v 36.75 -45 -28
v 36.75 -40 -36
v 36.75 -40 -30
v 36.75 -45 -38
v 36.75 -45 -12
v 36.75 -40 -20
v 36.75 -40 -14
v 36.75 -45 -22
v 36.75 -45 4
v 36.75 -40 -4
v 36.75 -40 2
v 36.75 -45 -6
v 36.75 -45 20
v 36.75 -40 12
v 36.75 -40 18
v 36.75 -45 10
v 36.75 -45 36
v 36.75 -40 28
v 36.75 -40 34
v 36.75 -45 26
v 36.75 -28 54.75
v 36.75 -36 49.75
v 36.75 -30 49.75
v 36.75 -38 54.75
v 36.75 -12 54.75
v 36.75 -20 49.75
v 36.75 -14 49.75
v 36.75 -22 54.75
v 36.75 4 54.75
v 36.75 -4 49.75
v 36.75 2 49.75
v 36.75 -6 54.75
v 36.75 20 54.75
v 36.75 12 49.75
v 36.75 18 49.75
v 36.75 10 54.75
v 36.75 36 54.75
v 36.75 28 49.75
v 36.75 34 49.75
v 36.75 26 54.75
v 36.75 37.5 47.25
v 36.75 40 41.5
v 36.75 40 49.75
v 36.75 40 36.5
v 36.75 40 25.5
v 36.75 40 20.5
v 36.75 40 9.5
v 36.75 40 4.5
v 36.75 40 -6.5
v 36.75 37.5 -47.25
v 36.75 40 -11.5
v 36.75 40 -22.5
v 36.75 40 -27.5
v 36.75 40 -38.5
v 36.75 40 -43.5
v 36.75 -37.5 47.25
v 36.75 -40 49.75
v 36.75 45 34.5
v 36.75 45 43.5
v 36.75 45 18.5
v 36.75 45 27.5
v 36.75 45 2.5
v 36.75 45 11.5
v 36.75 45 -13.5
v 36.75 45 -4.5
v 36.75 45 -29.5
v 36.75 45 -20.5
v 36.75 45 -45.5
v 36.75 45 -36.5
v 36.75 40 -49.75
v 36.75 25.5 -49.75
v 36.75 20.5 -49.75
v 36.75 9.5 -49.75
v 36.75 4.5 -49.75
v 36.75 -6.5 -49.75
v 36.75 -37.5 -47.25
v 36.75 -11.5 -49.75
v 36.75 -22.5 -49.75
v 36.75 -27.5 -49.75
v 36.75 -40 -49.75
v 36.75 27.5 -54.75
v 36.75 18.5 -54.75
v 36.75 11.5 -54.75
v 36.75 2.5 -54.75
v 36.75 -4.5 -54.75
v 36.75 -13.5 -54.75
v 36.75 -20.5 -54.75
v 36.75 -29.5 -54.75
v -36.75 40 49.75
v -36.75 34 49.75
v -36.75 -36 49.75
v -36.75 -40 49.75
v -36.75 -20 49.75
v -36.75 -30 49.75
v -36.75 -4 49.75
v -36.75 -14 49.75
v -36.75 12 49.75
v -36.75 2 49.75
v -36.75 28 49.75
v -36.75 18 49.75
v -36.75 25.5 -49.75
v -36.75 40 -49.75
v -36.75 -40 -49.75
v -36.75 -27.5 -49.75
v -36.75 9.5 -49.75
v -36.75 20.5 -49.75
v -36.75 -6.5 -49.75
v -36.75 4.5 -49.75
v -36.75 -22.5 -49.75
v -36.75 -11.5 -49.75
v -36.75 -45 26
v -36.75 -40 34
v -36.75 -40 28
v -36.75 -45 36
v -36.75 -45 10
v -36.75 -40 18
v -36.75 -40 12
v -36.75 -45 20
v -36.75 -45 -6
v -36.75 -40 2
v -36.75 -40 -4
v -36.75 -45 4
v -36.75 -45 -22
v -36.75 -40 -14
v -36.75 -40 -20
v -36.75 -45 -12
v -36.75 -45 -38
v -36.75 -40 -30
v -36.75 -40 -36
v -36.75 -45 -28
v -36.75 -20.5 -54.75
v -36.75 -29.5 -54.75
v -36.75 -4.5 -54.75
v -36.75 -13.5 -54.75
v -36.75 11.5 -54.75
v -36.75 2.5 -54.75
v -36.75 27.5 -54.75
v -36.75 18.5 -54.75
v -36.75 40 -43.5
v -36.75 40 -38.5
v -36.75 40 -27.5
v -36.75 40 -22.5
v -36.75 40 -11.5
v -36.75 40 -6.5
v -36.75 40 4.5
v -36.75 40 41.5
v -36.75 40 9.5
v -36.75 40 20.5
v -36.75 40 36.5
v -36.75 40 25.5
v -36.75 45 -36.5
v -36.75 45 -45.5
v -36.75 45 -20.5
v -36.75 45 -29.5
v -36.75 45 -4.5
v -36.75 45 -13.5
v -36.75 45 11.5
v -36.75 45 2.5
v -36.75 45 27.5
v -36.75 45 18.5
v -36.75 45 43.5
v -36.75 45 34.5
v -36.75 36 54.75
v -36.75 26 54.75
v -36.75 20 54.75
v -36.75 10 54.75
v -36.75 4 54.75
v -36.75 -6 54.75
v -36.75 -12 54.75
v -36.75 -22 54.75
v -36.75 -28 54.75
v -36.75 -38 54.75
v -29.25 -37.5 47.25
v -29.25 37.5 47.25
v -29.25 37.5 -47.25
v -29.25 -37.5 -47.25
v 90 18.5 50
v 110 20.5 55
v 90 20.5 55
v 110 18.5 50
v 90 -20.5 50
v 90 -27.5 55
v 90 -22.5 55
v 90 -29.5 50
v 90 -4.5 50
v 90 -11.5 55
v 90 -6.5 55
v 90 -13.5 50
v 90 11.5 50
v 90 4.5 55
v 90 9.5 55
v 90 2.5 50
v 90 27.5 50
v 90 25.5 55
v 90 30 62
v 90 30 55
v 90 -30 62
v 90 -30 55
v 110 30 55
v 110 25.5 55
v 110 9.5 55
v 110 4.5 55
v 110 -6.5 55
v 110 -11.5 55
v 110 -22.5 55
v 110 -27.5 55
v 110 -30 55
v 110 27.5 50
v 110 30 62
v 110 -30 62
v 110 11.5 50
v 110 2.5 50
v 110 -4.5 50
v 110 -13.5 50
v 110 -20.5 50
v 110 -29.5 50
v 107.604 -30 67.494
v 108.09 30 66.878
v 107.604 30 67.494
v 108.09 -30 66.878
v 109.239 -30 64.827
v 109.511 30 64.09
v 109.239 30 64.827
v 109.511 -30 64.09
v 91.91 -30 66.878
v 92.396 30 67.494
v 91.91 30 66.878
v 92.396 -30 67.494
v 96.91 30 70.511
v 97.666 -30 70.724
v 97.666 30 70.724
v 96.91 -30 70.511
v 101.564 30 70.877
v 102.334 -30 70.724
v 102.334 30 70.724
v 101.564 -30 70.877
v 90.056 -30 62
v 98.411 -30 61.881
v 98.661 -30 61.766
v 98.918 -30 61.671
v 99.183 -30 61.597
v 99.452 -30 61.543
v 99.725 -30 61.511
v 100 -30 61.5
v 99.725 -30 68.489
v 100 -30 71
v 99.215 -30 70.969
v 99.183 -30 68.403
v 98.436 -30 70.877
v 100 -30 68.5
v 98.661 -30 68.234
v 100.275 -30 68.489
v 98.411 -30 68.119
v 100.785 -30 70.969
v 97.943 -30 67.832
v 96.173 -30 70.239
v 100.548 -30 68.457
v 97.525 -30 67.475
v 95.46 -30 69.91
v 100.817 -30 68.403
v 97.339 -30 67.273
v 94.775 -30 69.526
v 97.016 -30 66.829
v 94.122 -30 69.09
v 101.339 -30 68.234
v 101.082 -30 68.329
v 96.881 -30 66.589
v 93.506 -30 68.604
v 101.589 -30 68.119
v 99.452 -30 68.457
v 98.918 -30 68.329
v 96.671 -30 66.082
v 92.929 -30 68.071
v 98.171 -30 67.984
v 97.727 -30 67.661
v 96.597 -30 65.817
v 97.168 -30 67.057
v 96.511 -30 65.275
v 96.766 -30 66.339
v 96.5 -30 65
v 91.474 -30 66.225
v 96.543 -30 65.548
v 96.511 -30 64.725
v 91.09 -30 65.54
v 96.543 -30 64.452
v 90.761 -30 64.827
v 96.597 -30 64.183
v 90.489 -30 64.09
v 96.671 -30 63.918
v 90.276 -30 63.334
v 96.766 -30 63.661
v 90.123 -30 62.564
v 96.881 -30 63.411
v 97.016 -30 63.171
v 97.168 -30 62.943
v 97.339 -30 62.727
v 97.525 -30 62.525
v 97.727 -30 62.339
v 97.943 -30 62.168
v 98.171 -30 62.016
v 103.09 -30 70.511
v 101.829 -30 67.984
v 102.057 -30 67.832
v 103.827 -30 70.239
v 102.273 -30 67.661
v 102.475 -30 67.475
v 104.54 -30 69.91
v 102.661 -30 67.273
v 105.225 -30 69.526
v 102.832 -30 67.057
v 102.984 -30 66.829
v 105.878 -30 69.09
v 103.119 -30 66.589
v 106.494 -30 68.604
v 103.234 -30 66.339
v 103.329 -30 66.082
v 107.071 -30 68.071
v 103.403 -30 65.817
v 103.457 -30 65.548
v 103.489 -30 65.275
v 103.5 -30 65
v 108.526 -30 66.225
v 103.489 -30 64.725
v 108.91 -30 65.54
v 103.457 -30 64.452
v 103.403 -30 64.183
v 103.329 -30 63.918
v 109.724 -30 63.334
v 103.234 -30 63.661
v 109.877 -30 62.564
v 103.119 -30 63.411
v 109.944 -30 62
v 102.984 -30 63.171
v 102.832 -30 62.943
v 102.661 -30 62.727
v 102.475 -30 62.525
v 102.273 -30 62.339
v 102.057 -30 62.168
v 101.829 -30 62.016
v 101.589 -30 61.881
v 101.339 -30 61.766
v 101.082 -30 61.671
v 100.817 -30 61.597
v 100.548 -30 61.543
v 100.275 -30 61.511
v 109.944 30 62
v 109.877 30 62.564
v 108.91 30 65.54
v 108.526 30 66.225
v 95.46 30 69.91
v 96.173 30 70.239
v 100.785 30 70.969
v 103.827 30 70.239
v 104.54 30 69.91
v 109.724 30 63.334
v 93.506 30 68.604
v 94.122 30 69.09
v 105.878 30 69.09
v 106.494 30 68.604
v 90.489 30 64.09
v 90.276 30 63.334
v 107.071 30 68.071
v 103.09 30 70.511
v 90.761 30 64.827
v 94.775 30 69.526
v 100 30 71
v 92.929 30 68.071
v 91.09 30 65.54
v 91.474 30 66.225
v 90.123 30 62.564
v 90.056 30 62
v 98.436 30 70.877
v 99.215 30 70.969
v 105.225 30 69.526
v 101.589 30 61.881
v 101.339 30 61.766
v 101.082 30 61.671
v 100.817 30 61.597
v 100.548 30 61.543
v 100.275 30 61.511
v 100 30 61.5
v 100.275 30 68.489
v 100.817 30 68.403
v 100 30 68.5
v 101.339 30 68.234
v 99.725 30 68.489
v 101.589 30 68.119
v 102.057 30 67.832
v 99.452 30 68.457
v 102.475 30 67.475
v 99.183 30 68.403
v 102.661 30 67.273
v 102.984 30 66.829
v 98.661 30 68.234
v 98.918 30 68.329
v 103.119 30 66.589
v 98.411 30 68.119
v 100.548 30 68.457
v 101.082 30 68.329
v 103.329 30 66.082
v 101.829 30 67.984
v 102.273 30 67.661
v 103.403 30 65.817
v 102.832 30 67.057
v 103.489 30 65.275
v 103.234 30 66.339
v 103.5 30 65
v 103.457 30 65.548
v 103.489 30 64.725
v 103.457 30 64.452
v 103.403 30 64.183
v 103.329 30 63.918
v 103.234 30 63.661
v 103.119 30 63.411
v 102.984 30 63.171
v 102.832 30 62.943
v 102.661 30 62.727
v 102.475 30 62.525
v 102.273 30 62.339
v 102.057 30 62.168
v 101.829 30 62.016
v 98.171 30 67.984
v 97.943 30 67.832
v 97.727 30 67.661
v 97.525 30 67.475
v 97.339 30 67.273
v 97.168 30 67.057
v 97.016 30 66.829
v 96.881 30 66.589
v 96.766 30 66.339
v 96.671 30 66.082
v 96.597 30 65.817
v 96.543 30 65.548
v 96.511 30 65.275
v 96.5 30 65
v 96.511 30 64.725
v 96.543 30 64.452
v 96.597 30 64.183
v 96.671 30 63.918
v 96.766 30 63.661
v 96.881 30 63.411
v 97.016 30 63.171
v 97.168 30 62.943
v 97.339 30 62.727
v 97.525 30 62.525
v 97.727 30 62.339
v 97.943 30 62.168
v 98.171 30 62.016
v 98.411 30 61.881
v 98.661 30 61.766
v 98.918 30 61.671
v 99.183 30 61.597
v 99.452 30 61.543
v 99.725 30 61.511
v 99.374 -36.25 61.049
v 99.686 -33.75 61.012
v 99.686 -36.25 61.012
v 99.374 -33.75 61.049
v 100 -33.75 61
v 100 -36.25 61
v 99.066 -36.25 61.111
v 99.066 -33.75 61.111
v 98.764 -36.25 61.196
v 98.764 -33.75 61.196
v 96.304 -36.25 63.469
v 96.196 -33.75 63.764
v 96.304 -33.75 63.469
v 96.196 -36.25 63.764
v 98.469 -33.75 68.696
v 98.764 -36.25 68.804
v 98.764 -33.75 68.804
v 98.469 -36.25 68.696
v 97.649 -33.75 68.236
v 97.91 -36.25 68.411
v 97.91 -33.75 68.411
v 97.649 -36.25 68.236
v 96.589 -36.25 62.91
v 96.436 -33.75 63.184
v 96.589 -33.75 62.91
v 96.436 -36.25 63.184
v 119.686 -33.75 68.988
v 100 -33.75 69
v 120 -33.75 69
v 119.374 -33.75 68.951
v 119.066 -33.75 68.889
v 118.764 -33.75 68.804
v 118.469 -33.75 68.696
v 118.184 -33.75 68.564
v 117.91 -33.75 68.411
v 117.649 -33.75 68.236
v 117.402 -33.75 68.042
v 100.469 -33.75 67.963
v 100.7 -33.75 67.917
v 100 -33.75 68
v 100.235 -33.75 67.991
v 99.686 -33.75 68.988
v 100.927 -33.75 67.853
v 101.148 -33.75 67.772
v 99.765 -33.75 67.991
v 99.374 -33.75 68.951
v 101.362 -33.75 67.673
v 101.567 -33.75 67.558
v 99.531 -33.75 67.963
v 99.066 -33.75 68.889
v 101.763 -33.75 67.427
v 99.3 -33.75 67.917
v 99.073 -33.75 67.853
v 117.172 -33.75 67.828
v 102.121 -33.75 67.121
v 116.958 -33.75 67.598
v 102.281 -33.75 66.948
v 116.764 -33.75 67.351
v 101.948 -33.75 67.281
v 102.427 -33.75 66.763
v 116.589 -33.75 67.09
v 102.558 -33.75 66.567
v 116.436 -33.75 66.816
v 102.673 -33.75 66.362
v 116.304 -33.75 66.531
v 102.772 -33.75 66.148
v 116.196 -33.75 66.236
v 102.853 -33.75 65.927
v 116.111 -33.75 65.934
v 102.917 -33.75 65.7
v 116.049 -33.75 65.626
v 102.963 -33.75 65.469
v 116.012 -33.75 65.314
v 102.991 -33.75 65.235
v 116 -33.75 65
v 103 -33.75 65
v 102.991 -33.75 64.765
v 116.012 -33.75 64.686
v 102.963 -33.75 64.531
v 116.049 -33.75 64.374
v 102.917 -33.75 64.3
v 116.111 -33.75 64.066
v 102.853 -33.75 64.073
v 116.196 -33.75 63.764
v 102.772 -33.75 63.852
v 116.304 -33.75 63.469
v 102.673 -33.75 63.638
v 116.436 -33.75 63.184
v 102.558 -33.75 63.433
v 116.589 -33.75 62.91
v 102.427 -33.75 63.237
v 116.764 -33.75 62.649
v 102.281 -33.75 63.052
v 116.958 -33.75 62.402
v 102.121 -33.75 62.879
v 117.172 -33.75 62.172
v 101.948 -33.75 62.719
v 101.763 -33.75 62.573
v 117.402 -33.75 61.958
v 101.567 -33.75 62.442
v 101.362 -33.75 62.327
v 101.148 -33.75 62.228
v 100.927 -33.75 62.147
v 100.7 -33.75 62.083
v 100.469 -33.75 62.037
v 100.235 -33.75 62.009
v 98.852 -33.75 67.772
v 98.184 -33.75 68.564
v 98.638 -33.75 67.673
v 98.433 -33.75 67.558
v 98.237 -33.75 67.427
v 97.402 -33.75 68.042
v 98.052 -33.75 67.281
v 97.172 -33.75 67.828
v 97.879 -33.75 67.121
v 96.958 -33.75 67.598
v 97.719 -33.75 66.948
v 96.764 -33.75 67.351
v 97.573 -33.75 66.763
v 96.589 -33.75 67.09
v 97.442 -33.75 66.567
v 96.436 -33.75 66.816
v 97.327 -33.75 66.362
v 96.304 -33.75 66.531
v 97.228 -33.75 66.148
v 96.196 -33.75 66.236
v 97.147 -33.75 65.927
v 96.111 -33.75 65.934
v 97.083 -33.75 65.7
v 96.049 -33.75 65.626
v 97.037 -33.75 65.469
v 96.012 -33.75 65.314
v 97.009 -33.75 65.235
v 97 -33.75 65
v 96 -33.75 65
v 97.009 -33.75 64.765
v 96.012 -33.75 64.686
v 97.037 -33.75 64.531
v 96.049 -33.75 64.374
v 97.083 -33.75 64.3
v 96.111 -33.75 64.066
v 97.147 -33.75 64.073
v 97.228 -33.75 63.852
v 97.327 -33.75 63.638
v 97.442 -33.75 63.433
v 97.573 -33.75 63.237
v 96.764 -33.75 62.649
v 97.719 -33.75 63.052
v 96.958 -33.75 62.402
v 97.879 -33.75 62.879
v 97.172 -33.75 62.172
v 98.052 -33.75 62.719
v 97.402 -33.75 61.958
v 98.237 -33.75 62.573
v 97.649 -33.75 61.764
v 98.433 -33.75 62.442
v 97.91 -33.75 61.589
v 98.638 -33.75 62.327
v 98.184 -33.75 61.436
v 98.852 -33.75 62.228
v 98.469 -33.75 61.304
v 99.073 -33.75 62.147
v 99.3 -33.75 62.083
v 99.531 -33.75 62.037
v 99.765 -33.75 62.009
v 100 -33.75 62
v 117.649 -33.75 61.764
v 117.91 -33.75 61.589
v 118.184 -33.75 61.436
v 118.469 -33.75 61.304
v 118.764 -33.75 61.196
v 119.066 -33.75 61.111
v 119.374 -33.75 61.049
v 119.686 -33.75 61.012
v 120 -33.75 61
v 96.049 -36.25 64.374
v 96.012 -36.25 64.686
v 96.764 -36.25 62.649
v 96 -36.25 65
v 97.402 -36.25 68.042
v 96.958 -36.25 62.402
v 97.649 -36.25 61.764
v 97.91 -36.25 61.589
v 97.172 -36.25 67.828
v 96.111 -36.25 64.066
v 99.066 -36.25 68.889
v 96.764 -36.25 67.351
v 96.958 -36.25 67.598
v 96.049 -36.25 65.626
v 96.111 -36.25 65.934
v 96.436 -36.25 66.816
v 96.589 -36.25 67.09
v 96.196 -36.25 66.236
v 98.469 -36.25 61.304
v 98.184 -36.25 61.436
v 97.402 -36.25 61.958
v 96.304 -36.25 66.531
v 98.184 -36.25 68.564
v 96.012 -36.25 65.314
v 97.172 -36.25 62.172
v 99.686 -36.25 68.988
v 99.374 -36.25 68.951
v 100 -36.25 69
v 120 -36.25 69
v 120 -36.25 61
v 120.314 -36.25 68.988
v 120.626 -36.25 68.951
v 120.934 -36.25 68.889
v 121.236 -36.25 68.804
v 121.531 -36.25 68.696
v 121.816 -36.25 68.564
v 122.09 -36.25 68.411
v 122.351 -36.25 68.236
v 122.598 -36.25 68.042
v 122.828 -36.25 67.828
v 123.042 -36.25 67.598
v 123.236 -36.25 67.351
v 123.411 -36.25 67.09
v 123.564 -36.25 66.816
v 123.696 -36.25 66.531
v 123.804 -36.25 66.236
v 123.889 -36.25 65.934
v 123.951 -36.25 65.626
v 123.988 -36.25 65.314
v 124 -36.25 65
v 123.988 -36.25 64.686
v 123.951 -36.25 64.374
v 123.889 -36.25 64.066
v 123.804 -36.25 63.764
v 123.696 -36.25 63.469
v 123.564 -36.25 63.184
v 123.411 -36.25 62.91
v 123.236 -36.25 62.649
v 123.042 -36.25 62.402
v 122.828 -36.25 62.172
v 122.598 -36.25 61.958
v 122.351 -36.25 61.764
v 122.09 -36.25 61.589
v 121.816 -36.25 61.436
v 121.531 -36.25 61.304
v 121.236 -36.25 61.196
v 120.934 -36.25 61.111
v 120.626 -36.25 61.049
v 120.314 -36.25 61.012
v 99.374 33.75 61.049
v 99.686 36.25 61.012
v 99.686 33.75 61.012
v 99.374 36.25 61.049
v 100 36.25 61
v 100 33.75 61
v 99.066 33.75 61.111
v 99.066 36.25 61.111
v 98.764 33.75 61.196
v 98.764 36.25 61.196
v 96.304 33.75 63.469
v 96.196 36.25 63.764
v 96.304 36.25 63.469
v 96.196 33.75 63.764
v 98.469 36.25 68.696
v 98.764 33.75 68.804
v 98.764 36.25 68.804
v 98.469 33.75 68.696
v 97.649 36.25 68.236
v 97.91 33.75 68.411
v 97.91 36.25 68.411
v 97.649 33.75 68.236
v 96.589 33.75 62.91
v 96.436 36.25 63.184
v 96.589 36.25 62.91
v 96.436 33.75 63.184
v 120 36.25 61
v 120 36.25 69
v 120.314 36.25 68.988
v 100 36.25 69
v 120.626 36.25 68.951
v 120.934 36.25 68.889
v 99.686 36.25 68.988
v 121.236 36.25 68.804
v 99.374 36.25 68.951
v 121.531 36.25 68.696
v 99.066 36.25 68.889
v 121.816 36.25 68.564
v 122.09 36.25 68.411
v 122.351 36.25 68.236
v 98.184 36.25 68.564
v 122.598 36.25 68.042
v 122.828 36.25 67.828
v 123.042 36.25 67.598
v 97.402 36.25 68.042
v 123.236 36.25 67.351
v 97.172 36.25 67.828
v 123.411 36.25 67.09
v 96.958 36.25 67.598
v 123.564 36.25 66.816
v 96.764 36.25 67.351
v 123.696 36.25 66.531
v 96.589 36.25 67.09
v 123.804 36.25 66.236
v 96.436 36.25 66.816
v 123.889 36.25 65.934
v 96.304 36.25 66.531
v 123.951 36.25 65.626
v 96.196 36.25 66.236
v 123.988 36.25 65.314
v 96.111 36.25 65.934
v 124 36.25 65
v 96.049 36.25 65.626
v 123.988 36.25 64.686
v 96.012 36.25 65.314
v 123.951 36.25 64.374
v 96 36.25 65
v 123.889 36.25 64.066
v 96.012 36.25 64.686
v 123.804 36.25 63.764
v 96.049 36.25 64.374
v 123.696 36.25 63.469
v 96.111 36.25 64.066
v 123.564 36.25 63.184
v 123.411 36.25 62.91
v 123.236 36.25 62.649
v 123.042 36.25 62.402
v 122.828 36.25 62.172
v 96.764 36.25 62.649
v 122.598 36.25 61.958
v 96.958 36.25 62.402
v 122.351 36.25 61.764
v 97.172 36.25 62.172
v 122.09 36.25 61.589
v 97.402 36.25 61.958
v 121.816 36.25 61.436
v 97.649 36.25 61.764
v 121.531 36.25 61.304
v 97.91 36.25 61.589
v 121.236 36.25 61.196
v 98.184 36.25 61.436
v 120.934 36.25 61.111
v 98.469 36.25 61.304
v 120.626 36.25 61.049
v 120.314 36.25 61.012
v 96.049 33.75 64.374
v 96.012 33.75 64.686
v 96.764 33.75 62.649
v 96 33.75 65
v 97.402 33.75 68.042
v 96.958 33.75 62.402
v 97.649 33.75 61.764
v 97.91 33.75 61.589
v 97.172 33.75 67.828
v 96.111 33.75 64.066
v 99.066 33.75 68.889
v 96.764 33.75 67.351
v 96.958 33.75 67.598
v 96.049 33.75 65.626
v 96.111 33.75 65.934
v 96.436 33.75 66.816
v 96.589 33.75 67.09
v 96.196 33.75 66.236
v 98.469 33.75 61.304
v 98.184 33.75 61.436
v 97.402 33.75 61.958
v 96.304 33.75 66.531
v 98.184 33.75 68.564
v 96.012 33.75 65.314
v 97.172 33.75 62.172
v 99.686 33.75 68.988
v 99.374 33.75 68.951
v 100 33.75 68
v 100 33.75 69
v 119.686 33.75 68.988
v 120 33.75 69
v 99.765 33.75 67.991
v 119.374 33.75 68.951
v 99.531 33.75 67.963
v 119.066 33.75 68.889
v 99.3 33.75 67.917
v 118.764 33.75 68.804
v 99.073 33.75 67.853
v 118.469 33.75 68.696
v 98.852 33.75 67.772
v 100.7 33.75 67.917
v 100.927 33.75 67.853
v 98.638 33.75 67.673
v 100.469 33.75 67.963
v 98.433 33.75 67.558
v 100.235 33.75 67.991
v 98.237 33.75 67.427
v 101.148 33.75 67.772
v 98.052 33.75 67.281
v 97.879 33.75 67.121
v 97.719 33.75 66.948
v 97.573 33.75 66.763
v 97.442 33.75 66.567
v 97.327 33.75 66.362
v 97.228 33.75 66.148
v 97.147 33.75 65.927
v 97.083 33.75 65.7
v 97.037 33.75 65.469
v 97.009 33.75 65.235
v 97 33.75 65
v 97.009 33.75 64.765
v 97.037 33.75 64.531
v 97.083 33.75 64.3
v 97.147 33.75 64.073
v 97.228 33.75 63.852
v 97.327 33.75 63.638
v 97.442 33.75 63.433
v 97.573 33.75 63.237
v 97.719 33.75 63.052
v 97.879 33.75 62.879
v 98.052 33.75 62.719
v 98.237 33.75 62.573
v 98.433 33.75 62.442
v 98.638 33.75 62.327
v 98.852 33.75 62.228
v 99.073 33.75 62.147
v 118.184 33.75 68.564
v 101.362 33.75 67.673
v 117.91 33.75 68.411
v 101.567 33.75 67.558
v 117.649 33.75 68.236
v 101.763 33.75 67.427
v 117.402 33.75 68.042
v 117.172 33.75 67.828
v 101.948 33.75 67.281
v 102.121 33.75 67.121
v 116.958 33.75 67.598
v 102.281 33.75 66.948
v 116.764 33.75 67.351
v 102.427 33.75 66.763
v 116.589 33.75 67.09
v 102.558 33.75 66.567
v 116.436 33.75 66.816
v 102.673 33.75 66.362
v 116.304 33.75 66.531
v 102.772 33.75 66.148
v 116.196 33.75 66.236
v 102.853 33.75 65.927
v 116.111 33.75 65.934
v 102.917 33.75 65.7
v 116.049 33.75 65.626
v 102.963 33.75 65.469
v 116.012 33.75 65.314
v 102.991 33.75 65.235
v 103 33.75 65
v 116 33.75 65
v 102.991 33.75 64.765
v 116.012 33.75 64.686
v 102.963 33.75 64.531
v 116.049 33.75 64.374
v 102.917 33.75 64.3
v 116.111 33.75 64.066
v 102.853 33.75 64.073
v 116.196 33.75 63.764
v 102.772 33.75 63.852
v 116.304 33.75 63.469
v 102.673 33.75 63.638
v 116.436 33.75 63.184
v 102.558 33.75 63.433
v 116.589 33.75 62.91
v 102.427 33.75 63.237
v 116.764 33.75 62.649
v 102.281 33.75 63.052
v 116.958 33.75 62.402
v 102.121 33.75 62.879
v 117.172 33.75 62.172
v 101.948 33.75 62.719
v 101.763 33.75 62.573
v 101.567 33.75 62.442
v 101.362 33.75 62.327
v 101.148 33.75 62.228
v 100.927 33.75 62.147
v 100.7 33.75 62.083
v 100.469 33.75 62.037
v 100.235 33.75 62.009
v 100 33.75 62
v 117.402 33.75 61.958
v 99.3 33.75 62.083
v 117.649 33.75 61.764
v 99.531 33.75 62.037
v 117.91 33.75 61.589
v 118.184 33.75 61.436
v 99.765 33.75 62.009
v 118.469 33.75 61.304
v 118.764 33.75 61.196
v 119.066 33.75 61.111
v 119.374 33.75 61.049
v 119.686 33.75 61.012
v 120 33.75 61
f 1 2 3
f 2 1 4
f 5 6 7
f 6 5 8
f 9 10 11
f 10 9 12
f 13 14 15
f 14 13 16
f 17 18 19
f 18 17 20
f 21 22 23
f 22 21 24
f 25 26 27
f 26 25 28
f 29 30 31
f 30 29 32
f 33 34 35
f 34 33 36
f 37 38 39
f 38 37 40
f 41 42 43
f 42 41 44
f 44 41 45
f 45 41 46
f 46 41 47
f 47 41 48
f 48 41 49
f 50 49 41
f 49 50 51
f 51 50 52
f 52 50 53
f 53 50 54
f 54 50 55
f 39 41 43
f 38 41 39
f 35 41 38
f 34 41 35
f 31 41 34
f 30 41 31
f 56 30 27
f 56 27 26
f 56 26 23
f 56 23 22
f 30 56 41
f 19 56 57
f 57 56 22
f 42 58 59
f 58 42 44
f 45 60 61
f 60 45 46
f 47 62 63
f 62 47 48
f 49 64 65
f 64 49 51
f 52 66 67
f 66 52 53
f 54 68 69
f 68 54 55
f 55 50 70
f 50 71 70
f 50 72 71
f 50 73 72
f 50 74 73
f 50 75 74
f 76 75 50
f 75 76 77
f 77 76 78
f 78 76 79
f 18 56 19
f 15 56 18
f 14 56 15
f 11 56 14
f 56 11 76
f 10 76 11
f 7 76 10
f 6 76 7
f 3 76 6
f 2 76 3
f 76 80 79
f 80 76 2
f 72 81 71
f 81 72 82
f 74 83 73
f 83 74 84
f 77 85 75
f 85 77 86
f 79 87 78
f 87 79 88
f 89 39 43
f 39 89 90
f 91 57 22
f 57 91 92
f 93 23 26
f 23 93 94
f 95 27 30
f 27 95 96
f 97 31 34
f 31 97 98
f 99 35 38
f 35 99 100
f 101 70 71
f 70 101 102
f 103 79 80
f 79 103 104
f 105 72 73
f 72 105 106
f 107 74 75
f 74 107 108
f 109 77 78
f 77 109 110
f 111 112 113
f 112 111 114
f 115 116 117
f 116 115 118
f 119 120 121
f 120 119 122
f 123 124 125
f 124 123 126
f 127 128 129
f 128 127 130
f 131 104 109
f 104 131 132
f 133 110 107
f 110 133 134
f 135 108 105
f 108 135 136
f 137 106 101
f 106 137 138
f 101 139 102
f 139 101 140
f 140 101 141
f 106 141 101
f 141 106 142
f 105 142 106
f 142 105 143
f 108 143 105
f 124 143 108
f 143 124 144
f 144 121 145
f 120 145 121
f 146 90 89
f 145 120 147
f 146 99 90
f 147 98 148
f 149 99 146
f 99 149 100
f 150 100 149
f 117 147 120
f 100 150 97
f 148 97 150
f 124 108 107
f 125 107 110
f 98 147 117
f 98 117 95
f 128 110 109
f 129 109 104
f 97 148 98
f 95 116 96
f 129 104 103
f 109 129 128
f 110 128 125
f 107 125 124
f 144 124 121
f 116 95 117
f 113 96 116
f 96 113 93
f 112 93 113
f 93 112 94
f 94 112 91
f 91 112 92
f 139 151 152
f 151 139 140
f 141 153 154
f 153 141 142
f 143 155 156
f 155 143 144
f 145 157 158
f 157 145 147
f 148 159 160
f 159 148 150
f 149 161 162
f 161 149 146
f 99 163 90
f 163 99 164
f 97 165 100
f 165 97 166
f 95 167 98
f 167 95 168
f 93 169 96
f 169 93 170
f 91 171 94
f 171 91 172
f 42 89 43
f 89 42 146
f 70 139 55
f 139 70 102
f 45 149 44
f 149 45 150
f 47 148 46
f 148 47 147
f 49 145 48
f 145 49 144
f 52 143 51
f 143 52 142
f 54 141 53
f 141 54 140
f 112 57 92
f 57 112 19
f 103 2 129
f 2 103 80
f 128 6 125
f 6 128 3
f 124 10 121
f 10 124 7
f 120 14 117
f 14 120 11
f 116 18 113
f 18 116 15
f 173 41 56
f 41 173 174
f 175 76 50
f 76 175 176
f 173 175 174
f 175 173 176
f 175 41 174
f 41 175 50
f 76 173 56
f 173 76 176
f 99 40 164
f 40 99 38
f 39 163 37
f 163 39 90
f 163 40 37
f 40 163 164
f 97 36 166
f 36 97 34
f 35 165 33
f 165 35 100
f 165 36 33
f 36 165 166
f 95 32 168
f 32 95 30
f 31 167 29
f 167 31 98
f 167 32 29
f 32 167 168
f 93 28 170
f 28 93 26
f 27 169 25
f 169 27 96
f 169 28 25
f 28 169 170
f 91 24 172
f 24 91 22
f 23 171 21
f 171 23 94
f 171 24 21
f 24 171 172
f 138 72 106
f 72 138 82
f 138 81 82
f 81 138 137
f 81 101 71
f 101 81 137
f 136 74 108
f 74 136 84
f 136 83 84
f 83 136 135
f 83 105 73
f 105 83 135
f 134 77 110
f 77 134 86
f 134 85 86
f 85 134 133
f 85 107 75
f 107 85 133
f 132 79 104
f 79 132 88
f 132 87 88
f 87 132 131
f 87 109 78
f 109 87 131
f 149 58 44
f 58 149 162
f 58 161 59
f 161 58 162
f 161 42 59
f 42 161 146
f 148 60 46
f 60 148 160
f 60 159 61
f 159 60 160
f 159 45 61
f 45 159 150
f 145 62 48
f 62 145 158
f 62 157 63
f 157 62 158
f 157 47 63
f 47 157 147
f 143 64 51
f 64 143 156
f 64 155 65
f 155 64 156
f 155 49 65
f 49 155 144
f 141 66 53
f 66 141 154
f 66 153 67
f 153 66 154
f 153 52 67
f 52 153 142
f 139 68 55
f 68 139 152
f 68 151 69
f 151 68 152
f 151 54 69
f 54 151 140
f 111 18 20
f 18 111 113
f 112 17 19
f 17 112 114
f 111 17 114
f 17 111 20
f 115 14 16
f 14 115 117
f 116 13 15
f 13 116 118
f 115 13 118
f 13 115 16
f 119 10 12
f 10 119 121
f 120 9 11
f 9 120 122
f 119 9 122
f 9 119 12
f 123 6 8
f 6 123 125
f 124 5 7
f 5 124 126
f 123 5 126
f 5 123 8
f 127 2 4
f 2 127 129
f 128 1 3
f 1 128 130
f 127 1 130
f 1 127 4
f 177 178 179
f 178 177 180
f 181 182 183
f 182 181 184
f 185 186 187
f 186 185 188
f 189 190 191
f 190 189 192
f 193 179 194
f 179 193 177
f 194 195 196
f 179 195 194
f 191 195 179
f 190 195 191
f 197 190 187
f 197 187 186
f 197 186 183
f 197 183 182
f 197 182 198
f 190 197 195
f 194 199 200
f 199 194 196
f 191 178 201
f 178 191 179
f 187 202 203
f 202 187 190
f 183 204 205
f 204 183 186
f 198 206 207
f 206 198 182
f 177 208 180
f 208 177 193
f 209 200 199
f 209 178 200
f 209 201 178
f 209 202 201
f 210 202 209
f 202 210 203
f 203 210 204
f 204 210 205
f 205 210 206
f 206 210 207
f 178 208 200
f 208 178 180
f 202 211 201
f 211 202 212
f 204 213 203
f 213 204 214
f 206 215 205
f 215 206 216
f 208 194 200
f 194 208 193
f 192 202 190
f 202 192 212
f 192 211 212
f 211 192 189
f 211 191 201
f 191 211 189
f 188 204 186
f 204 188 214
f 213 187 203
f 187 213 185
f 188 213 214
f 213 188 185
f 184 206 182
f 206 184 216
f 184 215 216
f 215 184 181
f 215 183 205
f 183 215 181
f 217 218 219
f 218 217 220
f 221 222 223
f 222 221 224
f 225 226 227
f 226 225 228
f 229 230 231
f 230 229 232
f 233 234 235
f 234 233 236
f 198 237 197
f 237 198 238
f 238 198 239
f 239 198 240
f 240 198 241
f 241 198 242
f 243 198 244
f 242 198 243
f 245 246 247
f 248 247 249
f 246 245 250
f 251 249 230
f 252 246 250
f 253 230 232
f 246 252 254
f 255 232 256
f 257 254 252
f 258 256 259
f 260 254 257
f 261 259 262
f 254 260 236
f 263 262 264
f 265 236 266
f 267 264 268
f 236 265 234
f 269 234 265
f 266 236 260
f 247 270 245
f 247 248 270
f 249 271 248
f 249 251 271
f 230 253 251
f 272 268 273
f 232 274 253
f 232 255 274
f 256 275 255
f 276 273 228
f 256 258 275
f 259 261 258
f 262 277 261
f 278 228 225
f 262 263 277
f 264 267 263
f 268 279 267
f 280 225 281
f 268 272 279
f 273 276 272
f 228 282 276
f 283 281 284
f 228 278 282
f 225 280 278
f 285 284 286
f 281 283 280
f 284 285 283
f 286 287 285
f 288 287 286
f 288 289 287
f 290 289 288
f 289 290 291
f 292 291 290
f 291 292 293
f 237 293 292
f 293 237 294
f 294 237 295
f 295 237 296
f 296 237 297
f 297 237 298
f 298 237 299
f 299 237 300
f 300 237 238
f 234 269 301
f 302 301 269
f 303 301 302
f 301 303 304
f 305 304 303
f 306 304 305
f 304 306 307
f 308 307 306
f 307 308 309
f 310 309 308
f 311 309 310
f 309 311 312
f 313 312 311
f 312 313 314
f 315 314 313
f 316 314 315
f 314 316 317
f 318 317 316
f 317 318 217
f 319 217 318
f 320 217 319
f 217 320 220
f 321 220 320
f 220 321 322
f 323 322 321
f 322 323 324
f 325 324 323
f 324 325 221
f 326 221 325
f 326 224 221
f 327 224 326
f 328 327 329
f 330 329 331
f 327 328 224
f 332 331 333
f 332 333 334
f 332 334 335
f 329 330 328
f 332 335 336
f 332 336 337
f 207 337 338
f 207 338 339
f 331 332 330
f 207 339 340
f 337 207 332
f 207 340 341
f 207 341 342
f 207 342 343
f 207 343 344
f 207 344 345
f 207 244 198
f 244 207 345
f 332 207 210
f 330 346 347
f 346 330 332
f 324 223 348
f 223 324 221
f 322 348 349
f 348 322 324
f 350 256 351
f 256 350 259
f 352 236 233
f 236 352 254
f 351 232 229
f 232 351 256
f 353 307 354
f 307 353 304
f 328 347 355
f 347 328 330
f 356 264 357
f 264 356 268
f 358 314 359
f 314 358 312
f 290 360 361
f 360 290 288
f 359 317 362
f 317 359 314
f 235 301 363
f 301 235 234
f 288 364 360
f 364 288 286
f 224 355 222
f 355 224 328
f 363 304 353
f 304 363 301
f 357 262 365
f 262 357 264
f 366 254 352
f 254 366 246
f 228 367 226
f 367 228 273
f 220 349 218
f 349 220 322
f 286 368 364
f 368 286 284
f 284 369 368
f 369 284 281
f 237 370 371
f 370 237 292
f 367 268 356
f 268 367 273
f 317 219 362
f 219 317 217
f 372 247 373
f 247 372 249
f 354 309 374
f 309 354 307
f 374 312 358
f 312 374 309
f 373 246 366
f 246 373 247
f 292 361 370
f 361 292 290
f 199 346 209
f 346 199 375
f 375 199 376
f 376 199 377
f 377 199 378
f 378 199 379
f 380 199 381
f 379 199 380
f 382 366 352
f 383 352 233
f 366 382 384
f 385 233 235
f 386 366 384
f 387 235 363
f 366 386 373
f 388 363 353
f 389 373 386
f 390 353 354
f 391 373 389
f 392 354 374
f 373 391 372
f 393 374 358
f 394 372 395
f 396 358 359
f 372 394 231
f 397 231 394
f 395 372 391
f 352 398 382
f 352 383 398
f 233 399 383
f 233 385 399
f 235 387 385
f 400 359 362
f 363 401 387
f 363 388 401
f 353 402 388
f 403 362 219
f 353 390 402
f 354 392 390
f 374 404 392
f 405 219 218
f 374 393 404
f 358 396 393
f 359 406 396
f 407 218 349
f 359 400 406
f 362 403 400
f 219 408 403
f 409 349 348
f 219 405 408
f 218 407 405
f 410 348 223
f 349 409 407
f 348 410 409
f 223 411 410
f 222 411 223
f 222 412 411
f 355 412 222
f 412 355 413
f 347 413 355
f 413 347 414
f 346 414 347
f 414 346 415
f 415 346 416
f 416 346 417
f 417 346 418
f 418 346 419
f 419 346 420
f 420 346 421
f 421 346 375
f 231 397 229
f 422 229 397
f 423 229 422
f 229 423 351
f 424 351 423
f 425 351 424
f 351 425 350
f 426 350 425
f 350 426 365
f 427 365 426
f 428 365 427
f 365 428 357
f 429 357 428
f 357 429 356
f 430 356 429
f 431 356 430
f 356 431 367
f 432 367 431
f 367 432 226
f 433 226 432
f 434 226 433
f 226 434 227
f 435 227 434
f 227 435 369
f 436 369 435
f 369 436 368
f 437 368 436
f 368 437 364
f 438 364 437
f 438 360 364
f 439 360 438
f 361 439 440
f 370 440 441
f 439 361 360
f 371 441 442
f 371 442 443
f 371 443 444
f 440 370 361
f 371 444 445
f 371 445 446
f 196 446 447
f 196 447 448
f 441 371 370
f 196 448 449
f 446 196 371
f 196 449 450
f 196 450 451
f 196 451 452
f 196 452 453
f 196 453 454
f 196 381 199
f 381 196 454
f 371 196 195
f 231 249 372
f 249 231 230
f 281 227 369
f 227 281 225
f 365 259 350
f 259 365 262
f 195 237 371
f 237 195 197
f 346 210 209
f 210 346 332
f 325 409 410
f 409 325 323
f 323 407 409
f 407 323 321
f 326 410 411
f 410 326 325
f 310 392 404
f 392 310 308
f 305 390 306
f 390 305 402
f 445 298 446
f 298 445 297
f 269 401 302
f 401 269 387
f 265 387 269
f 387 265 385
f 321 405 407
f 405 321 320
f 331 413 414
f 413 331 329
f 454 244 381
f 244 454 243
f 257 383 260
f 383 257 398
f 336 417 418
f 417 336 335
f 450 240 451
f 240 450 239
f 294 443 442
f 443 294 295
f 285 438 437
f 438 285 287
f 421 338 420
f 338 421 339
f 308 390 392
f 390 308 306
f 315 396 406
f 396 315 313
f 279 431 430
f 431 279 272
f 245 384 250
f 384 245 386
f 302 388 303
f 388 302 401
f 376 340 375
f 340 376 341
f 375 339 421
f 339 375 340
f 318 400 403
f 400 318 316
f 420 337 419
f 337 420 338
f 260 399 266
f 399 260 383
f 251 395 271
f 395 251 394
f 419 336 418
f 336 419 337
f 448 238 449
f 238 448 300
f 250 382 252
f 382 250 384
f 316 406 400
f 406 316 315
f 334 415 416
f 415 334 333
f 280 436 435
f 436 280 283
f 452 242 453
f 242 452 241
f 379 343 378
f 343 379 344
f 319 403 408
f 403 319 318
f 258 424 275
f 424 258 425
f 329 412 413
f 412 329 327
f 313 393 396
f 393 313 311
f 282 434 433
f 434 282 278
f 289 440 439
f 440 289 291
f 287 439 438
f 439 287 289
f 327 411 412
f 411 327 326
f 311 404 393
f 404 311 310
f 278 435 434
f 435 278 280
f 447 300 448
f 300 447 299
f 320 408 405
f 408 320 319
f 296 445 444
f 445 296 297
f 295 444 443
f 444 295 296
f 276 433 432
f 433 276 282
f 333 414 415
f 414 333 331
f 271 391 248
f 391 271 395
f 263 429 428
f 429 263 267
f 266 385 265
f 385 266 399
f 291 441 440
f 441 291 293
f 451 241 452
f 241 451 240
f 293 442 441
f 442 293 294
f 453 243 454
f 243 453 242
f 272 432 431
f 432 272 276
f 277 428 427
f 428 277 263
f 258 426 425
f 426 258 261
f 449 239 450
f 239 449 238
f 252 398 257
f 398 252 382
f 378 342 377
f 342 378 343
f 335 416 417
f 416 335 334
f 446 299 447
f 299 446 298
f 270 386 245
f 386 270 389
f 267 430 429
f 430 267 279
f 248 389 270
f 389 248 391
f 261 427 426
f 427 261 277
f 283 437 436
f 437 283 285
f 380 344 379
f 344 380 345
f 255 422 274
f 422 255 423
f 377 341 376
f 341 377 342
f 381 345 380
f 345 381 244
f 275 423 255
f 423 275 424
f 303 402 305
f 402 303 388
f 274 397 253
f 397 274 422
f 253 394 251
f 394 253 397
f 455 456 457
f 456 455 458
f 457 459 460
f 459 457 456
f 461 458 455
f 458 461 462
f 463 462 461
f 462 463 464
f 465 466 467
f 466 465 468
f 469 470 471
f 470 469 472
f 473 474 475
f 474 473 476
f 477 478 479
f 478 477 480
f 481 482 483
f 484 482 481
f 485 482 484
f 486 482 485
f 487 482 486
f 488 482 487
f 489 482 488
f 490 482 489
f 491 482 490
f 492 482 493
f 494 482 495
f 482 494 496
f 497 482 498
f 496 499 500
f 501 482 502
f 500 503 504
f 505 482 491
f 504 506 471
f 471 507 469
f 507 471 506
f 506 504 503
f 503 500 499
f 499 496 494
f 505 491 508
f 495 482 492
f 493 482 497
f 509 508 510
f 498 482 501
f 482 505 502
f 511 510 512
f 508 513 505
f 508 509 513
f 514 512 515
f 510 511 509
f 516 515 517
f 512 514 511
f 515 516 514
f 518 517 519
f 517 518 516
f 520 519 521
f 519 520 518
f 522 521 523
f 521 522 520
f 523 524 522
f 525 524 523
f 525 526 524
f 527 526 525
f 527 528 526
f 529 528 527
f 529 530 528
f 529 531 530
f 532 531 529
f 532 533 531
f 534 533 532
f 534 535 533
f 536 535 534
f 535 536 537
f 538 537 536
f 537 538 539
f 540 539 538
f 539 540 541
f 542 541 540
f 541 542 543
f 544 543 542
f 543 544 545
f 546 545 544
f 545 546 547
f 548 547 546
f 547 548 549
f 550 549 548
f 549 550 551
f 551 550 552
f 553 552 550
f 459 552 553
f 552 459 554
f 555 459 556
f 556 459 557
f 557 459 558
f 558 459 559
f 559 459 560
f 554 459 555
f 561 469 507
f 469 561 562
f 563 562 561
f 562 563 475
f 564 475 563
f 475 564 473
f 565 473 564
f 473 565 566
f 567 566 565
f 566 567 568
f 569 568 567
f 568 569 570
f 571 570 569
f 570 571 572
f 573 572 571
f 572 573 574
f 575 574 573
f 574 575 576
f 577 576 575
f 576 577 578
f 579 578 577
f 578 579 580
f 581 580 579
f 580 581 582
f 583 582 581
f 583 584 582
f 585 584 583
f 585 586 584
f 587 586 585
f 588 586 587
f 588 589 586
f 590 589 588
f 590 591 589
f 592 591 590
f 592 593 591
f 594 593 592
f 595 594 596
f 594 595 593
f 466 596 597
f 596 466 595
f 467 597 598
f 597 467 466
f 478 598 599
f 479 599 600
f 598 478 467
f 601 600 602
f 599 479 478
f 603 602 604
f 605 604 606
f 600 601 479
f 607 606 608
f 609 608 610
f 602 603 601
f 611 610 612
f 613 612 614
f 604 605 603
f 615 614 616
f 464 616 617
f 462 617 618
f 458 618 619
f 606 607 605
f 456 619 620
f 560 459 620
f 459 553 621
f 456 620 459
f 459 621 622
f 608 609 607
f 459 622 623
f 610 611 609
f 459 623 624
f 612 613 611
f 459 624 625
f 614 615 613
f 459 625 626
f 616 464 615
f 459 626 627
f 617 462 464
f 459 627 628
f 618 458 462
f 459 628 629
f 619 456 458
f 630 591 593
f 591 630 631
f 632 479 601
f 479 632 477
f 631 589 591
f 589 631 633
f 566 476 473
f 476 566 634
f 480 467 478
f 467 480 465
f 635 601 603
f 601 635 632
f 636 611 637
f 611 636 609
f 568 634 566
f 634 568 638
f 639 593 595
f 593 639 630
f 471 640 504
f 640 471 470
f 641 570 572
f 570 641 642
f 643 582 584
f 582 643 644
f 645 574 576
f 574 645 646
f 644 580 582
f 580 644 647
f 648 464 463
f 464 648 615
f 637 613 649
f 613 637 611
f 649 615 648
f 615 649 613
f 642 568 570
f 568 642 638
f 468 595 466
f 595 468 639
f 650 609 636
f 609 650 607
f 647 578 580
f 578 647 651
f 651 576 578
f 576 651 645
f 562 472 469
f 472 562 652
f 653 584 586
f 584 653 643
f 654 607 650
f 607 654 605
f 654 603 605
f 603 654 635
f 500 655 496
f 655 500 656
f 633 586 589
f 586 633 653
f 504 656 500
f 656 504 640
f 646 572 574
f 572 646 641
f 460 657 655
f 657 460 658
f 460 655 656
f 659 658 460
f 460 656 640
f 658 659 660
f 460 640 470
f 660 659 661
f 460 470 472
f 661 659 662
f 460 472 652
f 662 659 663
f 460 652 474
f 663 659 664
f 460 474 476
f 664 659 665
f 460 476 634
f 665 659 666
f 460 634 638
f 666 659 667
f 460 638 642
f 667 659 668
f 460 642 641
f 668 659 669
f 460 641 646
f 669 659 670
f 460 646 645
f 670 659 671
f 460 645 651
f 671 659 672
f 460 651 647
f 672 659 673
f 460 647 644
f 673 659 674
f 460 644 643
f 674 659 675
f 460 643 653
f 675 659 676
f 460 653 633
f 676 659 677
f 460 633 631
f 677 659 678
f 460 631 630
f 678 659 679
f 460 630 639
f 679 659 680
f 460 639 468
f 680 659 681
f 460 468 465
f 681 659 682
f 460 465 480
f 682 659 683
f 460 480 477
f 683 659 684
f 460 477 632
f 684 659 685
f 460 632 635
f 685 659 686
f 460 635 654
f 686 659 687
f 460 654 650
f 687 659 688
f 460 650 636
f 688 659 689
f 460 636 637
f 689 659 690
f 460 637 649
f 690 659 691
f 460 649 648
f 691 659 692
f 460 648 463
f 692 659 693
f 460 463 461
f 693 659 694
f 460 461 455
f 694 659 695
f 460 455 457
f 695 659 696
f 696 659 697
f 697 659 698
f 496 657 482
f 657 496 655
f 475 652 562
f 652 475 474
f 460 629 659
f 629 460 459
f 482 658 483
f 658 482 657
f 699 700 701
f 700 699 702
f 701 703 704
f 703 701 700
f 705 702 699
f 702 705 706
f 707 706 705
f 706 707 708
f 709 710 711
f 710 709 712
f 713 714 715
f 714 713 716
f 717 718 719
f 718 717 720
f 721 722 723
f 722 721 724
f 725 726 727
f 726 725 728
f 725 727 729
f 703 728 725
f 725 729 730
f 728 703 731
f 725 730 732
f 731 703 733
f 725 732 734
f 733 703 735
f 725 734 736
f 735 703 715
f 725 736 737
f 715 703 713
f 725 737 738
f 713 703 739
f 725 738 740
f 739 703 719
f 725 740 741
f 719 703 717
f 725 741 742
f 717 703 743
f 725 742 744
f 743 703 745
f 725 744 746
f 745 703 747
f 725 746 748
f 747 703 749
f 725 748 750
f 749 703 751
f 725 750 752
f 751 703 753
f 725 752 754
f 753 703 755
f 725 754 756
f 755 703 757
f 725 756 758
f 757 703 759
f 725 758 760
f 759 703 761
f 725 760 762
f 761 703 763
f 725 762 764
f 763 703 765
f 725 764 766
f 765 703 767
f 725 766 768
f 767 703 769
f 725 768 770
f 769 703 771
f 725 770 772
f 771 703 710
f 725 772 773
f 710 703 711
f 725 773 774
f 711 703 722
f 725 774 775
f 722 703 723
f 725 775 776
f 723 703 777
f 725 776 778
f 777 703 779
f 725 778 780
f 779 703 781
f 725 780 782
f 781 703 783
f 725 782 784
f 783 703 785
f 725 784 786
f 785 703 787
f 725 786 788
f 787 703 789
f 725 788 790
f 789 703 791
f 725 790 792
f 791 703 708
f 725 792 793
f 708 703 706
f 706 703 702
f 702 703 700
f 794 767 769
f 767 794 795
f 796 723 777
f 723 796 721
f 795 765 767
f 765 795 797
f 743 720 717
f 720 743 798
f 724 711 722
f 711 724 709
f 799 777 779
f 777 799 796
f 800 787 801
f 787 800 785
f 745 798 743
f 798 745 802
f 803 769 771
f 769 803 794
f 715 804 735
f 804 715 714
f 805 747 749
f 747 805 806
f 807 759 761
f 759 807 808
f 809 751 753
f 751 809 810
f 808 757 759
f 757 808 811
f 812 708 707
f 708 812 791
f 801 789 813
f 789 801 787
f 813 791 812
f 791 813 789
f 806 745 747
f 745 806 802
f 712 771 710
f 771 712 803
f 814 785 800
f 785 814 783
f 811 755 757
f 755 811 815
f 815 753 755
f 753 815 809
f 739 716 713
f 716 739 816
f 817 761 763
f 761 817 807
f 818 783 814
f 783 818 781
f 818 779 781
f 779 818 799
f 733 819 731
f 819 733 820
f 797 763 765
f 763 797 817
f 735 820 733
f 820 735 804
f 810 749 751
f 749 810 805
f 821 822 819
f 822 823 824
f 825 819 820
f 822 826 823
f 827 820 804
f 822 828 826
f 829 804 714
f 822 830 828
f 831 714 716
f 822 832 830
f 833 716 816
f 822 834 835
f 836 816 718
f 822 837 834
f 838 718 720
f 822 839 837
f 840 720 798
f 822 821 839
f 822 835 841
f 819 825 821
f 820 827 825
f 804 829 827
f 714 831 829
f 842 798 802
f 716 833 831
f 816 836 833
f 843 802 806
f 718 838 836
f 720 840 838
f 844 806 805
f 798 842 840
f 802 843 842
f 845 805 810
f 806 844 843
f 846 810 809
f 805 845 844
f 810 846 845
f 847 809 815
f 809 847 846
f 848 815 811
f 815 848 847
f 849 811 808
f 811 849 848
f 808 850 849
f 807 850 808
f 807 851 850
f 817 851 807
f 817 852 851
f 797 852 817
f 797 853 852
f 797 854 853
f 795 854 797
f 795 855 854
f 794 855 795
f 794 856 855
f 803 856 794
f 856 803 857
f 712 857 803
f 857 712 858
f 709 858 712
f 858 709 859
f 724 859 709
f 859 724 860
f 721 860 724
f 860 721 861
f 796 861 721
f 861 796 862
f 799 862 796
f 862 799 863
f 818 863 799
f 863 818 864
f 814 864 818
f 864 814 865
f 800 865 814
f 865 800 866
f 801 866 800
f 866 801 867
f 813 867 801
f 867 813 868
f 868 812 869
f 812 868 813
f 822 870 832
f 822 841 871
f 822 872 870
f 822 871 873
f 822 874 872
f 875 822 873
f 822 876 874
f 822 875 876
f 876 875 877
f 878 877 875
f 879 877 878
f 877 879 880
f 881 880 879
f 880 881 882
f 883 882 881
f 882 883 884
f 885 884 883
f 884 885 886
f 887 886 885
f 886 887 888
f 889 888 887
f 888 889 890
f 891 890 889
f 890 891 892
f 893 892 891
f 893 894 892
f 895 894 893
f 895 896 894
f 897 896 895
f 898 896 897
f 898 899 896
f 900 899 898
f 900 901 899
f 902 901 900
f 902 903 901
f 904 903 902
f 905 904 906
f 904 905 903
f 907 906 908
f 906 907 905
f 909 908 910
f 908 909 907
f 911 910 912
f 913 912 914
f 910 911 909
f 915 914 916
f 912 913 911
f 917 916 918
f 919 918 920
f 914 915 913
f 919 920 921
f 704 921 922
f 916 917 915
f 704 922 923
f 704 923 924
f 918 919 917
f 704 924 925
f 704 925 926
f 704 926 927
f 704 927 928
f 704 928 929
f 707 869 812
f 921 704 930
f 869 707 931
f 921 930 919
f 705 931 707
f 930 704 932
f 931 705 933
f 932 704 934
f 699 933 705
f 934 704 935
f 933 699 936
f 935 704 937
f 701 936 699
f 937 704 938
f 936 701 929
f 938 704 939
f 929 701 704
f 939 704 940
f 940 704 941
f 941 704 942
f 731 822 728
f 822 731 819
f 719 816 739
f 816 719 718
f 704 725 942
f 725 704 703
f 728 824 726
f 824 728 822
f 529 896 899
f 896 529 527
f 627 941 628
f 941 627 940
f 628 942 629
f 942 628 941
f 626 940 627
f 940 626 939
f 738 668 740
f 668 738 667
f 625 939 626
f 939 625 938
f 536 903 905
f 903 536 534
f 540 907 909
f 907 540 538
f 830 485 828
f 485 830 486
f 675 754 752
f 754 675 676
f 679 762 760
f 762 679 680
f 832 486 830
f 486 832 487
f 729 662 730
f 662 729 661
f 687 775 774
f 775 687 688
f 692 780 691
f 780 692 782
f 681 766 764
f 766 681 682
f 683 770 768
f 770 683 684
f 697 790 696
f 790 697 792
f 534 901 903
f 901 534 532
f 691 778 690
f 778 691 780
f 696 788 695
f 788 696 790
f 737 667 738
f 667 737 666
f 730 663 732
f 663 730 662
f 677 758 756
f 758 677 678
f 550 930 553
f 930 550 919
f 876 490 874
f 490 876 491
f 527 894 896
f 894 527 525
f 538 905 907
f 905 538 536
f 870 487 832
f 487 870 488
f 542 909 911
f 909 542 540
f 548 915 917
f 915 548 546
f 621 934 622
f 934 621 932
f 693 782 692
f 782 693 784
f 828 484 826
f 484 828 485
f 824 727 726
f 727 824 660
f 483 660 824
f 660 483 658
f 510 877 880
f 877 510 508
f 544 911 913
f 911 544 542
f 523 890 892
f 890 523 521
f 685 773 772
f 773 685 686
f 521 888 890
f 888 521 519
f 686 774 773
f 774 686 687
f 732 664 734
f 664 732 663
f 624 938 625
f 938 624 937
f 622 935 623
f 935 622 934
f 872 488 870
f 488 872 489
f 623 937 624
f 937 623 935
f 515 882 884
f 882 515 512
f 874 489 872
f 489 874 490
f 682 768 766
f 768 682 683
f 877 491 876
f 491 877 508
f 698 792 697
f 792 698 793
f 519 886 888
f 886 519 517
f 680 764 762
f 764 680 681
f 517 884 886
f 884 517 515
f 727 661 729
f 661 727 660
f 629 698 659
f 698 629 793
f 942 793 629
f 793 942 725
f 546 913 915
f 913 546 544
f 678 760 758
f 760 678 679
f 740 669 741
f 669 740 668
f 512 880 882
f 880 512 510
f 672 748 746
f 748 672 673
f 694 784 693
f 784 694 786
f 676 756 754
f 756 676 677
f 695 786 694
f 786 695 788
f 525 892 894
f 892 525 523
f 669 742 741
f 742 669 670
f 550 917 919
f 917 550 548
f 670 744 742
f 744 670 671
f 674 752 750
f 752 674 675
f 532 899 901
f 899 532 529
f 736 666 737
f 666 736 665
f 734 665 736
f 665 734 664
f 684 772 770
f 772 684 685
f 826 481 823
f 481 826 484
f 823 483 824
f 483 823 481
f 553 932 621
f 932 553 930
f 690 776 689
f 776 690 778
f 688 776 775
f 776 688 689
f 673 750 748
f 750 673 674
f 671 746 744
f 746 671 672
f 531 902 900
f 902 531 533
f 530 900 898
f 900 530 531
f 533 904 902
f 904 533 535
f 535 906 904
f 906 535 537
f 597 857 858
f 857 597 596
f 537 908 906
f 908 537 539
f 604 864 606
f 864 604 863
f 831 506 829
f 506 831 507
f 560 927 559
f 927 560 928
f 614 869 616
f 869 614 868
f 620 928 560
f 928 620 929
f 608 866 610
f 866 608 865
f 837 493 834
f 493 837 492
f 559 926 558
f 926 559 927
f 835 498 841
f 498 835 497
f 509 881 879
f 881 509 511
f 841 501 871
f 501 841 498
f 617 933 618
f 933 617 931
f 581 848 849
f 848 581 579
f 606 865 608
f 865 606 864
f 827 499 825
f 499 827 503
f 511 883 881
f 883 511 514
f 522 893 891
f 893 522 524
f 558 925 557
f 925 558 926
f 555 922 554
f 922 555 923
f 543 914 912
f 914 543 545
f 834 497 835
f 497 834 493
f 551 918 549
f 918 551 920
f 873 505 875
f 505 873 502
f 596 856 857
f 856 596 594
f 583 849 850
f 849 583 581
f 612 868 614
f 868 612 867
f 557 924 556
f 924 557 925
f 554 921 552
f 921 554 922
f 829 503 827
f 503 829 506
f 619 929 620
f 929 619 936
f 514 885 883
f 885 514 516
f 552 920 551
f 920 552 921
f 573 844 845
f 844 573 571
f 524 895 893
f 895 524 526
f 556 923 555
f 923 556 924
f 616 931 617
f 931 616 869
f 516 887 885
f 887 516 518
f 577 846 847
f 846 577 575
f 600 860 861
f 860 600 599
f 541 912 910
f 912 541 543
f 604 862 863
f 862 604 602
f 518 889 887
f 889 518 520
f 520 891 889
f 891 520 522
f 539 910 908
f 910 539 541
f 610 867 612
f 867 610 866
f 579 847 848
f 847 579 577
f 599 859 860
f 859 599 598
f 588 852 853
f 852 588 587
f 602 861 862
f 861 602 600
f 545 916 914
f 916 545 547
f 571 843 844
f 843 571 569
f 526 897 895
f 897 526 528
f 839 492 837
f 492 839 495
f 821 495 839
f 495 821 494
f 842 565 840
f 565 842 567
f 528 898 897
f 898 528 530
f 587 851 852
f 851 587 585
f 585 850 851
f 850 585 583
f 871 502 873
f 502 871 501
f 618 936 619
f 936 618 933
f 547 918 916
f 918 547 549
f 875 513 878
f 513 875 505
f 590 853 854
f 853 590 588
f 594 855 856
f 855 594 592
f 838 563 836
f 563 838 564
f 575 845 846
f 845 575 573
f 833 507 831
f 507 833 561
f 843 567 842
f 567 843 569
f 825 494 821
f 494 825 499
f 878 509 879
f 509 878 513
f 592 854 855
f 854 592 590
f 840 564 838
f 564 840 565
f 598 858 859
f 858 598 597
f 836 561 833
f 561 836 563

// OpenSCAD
nukeDiameter=185;
deckHeight=94.5; //92.5
deckWidth=68.5; //66.5
deckDepth=75; //68

deckBox();

translate([100, 0, 65])
rotate([270, 0, 0])
handle();

module deckBox() {
    union() {
        difference() {
            rotate([0, 0, 0])
            cube([deckWidth+5, deckDepth+5, deckHeight+5], true);
            
            translate([5, 0, 0])
            rotate([0, 0, 0])
            cube([deckWidth, deckDepth, deckHeight], true);
        }
        
        
        translate([-36.75, 52, 54.75])
        rotate([90, 180, 90])
        doveXs(deckDepth-1.5, 5);
        
        translate([-36.75, 52-8, -49.75])
        rotate([90, 180, 90])
        doveYs(deckDepth-1.5, 4);
        
        translate([-36.75, 40, 60])
        rotate([90, 90, 90])
        doveYs(deckDepth-1.5, 6);
        
        translate([-36.75, -45, 60-8])
        rotate([90, 90, 90])
        doveXs(deckDepth-1.5, 5);
    }
}

module lowerCover() {
    nukeInnerDiameter=174;

    cylinder(h=3, d=nukeInnerDiameter+10, $fn=200);    
}

module rotate_about_pt(a, v, pt) {
    translate(pt)
        rotate(a,v)
            translate(-pt)
                children();   
}

module doveXs(length=1, count) {
    union() {
        for ( i = [1:1:count]) 
            translate([i*16, 0, 0])
            linear_extrude(length)
            doveX();
    }
}

module doveYs(length=1, count) {
    union() {
        for ( i = [1:1:count]) 
            translate([i*16, 0, 0])
            linear_extrude(length)
            doveY();
    }
}

module doveX() {
    // 5 x 10
    // 5 x 6
    polygon(points = [
        [0, 0],  // Bottom-left
        [10, 0], // Bottom-right
        [8, 5],  // Top-right
        [2, 5]   // Top-left
    ], paths = [[0, 1, 2, 3]]);
}

module doveY() {
    // 5 x 10
    // 5 x 6
    polygon(points = [
        [2.5, 0],  // Bottom-left
        [7.5, 0], // Bottom-right
        [9.5, 5],  // Top-right
        [0.5, 5]   // Top-left
    ], paths = [[0, 1, 2, 3]]);
}

module handle() {
    union() {
        translate([-10, 10, 44])
        rotate([0, 90, 0])
        doveYs(20, 4);
        
        translate([0, 0, 0])
        difference() {
            union() {
                translate([0, 4, 0])
                cylinder(h=60, d=20, $fn=80, center=true);            
                translate([0, 8, 0])
                cube([20, 10, 60], true);
            }
            
            translate([0, 15, 0])
            cube([20, 10, 60], true);
            
            translate([0, 0, -35])
            cylinder(h=70, d=7, $fn=80);
        }
        
        translate([0, 0, -35])
        cylinder(h=70, d=6, $fn=80);
        
        rotate([0, 0, 90])
        grip();
    }
}

module grip() {      
    union() {
        translate([0, 0, -35])
        gripHalf();
        
        translate([0, 0, 35])
        gripHalf(); 
        
        translate([0, -20, 0])
        cylinder(h=72.5, d=8, $fn=80, center = true);
    }
}

module gripHalf() {
    union () {
        cylinder(h=2.5, d=8, $fn=80, center = true);
        
        translate([0, -10, 0])
        cube([8, 20, 2.5], true);
    }
}
